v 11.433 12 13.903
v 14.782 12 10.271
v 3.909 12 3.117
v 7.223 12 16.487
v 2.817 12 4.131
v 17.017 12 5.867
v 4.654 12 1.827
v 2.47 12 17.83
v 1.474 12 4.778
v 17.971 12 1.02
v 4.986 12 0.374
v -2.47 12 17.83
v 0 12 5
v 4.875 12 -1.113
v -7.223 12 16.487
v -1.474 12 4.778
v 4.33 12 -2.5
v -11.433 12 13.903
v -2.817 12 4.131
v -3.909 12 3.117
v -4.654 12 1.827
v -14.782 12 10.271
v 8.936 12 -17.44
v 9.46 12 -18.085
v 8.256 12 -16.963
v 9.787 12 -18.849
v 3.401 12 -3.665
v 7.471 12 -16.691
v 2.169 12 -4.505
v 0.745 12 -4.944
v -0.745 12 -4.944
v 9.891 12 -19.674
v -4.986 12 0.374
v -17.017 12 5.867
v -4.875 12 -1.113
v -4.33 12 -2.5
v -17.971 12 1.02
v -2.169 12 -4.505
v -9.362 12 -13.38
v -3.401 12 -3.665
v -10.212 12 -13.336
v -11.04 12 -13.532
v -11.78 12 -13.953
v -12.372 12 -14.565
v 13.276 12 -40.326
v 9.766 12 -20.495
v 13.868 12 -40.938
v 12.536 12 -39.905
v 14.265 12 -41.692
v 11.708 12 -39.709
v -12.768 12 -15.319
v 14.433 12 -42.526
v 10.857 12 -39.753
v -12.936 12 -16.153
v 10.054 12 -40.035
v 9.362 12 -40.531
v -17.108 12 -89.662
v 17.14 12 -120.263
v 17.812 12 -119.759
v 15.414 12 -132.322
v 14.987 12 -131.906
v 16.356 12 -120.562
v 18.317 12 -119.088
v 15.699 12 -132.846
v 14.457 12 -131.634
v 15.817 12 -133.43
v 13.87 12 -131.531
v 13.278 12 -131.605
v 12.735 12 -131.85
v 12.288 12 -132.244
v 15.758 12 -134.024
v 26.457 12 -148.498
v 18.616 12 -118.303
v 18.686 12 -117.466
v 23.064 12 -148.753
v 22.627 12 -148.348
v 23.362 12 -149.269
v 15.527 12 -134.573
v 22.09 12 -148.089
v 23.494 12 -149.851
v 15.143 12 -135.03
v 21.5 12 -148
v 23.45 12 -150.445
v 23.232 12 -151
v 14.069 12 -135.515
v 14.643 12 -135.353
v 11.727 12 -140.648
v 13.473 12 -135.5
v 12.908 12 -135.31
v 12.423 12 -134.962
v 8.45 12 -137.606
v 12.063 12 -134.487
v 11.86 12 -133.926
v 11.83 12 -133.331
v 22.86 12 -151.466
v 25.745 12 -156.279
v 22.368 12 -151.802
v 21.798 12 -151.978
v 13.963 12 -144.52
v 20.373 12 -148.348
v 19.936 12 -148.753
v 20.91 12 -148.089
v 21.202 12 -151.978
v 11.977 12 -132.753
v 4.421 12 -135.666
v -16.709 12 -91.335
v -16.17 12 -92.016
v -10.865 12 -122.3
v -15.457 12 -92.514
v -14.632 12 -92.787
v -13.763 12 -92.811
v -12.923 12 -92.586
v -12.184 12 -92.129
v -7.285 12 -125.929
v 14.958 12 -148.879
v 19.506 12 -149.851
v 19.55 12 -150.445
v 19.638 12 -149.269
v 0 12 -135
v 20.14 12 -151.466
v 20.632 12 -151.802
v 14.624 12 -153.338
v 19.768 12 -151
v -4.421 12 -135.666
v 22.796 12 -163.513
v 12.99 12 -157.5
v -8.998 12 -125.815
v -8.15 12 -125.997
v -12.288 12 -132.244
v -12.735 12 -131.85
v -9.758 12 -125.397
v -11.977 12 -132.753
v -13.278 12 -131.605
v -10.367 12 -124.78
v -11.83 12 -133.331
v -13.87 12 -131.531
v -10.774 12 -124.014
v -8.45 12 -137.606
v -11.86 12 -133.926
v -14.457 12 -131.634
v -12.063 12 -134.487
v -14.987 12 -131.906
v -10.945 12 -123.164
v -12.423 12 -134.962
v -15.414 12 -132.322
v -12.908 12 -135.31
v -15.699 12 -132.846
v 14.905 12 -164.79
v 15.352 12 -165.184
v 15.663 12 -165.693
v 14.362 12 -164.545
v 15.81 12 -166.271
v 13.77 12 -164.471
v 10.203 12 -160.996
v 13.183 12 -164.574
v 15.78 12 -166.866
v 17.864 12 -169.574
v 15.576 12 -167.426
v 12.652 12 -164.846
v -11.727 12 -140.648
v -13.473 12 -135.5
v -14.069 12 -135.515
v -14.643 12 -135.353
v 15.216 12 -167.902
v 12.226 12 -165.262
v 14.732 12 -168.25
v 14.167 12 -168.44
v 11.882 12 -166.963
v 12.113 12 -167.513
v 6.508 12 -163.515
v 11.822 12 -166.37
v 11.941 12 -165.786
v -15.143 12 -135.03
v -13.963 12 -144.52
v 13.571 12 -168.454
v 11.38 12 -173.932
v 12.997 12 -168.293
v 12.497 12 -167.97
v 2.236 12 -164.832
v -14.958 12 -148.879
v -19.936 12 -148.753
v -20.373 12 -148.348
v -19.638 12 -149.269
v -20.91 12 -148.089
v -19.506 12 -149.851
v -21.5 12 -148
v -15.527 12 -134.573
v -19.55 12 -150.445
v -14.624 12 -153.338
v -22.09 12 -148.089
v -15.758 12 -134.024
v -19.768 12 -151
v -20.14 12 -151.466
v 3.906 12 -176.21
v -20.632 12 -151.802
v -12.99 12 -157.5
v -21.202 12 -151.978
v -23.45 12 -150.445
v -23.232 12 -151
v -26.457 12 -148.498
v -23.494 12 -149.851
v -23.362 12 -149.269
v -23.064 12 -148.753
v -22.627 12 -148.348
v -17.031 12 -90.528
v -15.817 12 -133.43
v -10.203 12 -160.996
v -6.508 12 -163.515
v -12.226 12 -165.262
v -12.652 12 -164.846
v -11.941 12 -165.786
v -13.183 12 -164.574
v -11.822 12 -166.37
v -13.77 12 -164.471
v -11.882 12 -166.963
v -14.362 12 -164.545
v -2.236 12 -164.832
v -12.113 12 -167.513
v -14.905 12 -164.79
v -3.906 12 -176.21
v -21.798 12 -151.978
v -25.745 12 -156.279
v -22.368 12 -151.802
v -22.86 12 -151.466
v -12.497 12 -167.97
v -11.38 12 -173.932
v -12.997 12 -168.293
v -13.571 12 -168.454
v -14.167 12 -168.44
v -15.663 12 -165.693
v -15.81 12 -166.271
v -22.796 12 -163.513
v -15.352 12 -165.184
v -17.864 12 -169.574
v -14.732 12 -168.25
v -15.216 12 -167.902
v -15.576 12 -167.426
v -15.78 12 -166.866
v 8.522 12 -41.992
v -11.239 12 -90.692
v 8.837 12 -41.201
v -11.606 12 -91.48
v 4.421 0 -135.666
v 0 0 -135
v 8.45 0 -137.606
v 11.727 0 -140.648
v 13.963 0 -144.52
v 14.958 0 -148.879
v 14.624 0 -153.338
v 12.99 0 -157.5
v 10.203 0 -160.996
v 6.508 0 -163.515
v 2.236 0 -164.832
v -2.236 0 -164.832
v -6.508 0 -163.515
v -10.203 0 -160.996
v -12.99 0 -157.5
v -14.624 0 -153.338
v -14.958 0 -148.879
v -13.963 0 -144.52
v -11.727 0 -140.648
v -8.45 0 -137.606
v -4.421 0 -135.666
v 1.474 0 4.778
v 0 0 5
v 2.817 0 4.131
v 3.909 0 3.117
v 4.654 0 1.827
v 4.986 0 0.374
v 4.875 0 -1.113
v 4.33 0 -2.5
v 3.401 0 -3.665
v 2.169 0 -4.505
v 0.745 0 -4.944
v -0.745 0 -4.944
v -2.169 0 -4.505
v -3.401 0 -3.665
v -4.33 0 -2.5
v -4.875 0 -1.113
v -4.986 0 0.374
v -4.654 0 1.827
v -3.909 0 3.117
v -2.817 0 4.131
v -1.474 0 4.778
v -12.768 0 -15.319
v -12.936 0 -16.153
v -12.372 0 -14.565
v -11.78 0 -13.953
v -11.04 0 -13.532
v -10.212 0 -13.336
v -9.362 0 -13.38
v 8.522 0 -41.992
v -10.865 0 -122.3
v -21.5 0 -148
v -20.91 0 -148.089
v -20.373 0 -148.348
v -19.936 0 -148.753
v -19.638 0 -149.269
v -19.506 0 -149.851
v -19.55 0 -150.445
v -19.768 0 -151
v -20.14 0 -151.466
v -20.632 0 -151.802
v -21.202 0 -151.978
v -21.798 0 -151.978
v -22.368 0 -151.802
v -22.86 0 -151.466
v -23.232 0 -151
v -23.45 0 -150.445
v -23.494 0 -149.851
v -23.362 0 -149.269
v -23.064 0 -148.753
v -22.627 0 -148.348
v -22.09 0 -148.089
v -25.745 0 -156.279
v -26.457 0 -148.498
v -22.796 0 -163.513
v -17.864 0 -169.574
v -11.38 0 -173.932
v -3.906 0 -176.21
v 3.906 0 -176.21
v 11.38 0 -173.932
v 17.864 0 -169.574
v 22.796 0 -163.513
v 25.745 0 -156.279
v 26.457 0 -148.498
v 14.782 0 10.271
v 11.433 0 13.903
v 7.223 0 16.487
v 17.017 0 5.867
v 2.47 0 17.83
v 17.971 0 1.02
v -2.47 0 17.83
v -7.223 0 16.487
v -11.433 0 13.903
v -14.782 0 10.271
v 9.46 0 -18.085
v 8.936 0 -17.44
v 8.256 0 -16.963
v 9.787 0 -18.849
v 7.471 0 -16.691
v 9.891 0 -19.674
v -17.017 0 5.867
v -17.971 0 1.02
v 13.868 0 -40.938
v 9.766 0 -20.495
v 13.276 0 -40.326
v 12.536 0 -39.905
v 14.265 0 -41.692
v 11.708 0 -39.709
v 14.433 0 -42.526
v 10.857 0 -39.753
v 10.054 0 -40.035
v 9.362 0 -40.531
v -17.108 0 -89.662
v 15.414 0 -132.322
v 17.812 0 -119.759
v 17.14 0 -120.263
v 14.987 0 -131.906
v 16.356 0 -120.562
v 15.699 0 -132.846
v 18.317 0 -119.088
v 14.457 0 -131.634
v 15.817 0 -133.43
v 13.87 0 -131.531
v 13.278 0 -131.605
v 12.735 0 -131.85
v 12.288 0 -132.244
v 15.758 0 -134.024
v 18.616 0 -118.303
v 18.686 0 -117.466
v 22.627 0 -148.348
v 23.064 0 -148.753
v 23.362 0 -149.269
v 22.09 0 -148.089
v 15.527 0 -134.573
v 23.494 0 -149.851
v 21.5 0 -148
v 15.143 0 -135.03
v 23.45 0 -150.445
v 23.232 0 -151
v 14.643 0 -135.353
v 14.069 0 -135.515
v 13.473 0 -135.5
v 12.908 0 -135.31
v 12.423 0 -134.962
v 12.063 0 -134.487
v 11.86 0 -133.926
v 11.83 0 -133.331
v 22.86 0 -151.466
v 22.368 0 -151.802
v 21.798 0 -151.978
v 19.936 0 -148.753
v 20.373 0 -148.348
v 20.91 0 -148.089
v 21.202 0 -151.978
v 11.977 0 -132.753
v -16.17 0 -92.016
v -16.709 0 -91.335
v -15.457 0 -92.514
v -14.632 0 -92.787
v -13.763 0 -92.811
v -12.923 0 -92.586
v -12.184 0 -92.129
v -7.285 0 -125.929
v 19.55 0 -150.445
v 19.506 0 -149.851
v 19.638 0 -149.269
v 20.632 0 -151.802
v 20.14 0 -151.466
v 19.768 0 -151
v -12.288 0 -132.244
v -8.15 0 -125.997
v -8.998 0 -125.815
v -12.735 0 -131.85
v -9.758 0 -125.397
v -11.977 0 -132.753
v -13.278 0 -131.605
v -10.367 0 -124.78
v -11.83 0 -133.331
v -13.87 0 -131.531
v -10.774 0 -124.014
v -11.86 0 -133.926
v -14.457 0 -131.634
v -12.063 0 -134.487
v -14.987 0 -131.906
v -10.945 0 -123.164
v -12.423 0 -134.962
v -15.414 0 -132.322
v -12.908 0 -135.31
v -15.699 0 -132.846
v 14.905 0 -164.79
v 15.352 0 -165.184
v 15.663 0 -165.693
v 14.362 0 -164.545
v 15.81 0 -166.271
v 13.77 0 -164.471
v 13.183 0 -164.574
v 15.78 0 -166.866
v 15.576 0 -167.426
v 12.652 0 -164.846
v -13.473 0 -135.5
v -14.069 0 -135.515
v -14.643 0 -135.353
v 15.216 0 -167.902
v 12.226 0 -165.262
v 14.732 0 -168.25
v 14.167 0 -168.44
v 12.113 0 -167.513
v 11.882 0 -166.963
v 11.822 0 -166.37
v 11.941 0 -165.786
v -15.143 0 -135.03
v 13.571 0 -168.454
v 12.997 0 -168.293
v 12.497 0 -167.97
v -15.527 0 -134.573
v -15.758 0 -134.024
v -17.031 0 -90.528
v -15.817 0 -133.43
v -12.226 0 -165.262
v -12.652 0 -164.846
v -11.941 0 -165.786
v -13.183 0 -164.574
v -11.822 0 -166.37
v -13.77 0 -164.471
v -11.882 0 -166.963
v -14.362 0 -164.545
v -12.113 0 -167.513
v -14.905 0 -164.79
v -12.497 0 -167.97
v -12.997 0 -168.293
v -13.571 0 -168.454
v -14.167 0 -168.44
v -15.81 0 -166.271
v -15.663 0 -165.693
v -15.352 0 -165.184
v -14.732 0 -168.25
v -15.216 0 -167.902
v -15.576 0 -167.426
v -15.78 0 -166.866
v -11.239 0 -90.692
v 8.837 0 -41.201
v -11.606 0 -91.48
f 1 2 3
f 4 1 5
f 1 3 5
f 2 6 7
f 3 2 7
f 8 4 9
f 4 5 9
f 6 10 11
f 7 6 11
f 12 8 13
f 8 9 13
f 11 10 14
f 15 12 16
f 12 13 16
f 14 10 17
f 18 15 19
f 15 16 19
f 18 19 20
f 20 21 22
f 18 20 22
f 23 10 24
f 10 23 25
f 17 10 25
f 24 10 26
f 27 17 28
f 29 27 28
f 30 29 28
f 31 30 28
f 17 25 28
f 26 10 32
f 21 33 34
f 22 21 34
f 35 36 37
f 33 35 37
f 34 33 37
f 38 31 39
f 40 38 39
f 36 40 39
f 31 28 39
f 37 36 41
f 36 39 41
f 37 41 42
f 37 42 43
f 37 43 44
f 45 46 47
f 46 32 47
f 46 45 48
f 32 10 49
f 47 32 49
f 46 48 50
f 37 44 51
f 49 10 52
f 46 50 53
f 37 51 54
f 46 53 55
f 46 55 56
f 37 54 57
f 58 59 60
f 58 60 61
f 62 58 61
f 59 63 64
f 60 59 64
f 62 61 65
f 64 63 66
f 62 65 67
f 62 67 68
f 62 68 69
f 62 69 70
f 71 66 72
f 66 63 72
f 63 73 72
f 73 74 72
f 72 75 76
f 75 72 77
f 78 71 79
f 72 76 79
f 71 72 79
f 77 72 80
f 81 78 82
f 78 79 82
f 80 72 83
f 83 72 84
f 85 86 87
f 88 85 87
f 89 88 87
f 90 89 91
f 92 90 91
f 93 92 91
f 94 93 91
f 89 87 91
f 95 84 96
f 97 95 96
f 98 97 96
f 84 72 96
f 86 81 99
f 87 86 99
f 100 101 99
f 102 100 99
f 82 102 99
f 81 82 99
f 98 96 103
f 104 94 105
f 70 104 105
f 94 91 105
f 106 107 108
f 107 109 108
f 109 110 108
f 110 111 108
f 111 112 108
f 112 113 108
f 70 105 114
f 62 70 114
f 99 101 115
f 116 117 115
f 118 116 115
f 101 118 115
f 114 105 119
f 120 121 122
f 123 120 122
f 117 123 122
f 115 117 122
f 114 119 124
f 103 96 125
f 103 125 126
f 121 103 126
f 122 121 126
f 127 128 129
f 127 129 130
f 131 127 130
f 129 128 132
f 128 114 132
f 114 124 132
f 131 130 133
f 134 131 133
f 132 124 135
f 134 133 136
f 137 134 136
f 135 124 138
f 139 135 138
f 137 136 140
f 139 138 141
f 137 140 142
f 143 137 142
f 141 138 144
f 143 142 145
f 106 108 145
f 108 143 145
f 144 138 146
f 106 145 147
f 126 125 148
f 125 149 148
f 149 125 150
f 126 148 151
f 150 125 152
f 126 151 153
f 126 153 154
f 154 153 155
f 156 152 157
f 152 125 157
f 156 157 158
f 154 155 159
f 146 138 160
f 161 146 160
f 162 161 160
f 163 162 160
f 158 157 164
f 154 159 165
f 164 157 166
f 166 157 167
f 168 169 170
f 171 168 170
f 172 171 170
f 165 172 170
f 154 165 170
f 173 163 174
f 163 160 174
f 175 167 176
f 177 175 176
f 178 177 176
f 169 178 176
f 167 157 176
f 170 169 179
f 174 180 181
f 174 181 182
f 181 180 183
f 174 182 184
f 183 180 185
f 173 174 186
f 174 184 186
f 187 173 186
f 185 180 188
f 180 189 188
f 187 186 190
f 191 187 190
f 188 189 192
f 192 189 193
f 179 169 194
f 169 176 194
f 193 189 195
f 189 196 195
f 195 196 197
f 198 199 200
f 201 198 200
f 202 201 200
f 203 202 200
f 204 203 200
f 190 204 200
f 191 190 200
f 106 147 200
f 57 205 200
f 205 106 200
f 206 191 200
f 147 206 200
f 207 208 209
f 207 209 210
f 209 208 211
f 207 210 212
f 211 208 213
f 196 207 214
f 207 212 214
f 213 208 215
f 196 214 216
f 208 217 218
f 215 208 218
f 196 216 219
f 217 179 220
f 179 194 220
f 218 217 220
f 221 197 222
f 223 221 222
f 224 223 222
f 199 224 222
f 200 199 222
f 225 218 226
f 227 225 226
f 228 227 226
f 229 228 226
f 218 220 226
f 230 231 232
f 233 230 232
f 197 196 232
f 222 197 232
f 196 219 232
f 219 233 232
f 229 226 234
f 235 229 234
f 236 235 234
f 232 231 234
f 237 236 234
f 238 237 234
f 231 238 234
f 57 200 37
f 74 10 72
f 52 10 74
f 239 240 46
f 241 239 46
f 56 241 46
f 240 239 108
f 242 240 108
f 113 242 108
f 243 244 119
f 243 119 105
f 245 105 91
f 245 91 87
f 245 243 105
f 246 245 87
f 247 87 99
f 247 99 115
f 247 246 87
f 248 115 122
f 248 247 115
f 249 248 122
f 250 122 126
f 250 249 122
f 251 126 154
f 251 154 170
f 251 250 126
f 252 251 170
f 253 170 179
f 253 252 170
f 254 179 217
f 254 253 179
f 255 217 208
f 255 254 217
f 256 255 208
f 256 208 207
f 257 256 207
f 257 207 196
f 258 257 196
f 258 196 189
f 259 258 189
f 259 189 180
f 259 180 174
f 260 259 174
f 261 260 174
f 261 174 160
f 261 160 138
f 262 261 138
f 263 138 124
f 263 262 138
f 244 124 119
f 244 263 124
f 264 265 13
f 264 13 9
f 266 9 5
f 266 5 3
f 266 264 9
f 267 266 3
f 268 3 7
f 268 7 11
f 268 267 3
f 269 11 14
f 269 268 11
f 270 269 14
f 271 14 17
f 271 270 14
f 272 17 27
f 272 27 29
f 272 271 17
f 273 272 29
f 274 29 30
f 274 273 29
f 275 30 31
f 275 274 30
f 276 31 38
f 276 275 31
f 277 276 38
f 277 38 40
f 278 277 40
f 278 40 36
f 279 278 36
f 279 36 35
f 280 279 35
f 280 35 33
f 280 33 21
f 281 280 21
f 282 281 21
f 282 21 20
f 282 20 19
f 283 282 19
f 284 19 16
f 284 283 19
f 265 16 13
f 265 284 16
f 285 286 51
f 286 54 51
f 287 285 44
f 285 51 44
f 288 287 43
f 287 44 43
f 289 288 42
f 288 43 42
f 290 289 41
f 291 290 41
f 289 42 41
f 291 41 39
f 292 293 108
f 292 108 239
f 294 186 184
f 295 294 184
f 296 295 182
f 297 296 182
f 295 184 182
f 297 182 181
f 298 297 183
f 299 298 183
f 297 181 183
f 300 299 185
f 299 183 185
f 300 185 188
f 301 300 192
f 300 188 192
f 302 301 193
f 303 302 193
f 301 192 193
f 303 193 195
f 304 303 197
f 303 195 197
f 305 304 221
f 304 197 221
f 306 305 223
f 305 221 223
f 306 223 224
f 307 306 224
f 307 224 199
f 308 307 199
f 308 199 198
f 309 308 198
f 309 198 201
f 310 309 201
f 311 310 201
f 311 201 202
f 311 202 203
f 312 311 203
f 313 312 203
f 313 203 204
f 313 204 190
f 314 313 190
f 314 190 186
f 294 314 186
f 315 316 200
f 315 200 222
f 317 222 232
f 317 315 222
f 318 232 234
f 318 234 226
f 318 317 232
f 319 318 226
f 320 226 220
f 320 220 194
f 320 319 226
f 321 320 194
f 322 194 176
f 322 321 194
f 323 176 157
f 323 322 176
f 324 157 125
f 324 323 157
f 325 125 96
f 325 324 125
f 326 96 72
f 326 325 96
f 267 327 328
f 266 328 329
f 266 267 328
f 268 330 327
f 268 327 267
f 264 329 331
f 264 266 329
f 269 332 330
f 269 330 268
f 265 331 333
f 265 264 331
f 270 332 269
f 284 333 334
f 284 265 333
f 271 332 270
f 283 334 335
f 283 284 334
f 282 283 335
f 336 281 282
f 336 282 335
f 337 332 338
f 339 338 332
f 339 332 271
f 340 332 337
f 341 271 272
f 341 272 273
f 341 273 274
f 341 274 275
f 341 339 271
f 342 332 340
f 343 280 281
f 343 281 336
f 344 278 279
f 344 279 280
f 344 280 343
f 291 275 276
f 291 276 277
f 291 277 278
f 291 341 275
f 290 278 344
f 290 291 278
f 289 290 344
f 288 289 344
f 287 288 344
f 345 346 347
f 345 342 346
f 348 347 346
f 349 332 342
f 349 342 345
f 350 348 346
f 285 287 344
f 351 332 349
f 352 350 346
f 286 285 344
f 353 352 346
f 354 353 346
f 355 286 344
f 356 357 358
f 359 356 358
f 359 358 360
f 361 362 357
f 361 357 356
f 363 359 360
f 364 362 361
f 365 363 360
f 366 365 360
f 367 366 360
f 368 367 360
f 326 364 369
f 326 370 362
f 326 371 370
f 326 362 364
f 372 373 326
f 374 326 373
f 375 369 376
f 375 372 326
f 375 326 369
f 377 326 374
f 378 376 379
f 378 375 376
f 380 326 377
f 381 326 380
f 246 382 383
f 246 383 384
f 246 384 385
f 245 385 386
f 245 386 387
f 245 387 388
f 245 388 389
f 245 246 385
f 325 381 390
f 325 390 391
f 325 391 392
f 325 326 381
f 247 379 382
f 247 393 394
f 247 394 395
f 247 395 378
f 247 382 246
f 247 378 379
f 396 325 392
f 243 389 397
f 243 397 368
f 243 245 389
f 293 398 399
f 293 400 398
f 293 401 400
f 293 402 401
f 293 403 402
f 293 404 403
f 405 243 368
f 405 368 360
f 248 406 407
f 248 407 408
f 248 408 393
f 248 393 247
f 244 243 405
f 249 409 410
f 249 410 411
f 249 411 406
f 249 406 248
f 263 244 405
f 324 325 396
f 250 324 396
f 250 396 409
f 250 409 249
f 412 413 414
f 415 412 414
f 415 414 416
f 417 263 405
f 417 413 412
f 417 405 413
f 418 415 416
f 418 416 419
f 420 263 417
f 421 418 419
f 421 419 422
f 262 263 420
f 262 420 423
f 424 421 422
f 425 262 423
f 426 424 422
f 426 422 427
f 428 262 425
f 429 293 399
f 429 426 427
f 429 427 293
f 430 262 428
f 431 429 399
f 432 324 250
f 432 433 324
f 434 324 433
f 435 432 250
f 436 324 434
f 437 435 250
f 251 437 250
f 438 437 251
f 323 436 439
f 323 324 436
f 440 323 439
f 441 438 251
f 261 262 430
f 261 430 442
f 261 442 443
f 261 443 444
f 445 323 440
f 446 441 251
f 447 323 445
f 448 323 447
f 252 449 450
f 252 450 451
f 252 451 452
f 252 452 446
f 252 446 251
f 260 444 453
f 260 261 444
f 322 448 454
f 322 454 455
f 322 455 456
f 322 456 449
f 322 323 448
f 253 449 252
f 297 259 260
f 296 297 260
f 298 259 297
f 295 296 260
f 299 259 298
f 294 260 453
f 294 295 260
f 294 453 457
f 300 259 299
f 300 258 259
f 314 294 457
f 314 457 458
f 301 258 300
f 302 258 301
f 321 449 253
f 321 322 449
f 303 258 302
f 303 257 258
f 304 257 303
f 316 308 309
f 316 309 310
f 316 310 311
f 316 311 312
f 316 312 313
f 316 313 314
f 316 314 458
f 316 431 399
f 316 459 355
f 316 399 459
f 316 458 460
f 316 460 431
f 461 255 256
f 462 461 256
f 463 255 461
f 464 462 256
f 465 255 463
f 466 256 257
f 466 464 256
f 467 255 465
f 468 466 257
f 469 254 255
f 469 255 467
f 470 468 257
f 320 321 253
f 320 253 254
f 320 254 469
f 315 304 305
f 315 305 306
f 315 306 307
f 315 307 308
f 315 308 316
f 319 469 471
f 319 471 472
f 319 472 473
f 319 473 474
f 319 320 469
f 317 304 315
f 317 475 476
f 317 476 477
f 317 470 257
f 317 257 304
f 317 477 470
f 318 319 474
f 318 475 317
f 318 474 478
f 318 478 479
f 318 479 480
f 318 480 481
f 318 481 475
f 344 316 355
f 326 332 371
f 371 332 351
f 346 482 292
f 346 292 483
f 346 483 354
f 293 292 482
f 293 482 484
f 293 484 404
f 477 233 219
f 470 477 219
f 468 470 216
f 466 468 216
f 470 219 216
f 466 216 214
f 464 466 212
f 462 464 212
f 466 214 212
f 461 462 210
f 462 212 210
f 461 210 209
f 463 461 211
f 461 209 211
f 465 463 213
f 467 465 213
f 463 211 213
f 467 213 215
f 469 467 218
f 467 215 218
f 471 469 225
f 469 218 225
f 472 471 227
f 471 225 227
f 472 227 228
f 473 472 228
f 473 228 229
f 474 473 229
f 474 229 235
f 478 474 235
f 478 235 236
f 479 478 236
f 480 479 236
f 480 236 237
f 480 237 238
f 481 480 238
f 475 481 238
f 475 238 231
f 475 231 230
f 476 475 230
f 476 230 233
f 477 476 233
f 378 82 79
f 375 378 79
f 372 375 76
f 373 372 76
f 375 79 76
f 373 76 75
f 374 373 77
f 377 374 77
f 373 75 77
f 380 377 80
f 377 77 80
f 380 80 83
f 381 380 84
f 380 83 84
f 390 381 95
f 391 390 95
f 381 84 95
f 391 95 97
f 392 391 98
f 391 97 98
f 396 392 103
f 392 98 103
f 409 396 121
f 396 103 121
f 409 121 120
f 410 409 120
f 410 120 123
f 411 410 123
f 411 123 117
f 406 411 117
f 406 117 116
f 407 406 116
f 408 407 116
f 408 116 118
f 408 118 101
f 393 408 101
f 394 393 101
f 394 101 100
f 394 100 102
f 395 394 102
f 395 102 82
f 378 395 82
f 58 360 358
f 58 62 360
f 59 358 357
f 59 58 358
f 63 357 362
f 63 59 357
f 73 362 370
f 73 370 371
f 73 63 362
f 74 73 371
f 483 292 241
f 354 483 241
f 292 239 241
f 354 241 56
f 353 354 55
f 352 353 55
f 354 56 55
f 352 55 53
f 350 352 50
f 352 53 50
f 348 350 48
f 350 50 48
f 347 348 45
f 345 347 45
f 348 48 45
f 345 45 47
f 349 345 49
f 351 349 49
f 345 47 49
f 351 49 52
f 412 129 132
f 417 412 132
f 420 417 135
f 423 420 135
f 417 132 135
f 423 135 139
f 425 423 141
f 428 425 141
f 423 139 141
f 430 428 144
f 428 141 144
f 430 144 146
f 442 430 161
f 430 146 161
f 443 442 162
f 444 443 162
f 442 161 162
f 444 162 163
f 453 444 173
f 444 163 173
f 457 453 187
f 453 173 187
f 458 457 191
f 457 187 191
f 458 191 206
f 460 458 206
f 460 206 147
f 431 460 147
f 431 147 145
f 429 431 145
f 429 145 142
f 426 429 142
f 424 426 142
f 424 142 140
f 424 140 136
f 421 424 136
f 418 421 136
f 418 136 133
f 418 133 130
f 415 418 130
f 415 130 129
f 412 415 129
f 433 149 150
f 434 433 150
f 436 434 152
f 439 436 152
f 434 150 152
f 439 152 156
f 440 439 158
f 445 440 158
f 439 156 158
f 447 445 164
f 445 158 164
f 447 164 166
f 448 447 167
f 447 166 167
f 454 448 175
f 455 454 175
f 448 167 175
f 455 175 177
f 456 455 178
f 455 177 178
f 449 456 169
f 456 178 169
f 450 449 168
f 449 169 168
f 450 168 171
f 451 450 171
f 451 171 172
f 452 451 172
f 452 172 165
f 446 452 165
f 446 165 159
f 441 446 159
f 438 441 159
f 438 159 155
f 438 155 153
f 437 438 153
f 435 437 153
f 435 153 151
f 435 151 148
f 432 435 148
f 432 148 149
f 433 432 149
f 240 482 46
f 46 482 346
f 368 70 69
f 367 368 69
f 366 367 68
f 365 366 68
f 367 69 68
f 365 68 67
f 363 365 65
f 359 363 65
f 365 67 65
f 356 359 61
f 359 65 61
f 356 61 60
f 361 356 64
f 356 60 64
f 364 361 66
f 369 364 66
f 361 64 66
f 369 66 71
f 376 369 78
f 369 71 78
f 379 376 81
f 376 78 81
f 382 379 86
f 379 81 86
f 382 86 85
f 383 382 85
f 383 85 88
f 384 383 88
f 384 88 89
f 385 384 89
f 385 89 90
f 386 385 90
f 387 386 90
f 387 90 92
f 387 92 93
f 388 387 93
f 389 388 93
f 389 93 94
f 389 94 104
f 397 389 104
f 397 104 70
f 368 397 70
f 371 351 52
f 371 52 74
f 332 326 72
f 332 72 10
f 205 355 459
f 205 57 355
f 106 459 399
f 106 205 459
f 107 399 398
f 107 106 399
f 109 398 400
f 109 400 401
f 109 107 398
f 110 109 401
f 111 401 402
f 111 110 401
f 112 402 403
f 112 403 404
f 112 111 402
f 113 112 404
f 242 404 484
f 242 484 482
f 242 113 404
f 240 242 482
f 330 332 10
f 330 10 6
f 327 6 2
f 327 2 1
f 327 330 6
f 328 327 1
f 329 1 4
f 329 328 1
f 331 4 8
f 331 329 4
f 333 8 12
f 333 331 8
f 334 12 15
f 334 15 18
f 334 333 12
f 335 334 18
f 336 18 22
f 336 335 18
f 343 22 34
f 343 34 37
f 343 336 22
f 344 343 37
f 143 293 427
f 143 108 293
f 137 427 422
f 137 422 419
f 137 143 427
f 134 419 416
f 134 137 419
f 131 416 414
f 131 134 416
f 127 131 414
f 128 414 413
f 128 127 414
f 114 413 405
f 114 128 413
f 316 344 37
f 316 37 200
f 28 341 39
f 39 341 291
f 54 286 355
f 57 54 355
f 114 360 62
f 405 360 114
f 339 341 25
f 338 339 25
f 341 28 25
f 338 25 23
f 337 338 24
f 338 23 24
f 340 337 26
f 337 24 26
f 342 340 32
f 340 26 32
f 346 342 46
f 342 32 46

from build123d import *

# Parameters (mm, degrees)
SKETCH_1_R               = 5
SKETCH_1_R_2             = 15
EXTRUDE_1_DEPTH          = 12
FILLET_1_R               = 3
SKETCH_2_R               = 2
CUT_EXTRUDE_1_DEPTH      = 179.881245523
PATTERN_CIRCULAR_3_COUNT = 2
PATTERN_CIRCULAR_3_ANGLE = 50
PATTERN_CIRCULAR_4_COUNT = 2
PATTERN_CIRCULAR_4_ANGLE = 50


with BuildPart() as part:
    # 草图1 → 凸台-拉伸1 (new body)
    with BuildSketch(Plane(origin=(0, 0, 0), x_dir=(1, 0, 0), z_dir=(0, 1, 0))):
        with BuildLine():
            Line((-17.971076762, -1.02), (-26.457418567, 148.498333333))
            ThreePointArc((-26.457418567, 148.498333333), (0, 176.5), (26.457418567, 148.498333333))
            Line((26.457418567, 148.498333333), (17.971076762, -1.02))
            ThreePointArc((17.971076762, -1.02), (0, -18), (-17.971076762, -1.02))
        make_face()
        with Locations(Location((0, 0, 0), (0, 0, 270))):
            Circle(SKETCH_1_R, mode=Mode.SUBTRACT)
        with Locations(Location((0, 150, 0), (0, 0, 270))):
            Circle(SKETCH_1_R_2, mode=Mode.SUBTRACT)
        Polygon((-12.740980954, 12.714849757), (-18.554385191, 115.139490738), (10.712851955, 17.329399023), align=None, mode=Mode.SUBTRACT)
        Polygon((13.283215706, 22.268322657), (18.830257334, 120), (-12, 127), align=None, mode=Mode.SUBTRACT)
    extrude(amount=EXTRUDE_1_DEPTH)

    # 圆角1
    fillet_1_edges = [part.edges().sort_by_distance(p)[0] for p in [
        (-12.740980954, 6, -12.714849757),
        (10.712851955, 6, -17.329399023),
        (-18.554385191, 6, -115.139490738),
        (18.830257334, 6, -120),
        (-12, 6, -127),
        (13.283215706, 6, -22.268322657),
    ]]
    fillet(fillet_1_edges, radius=FILLET_1_R)

    # 草图2 → 切除-拉伸1 (cut, through all)
    with BuildSketch(Plane(origin=(0, 12, 0), x_dir=(1, 0, 0), z_dir=(0, 1, 0))):
        with Locations(Location((-21.5, 150, 0), (0, 0, 270))):
            Circle(SKETCH_2_R)
        with Locations(Location((21.5, 150, 0), (0, 0, 270))):
            Circle(SKETCH_2_R)
    cut_extrude_1 = extrude(amount=-CUT_EXTRUDE_1_DEPTH, mode=Mode.SUBTRACT)

    # 阵列(圆周)3: 切除-拉伸1 ×2 about axis
    pattern_circular_3_axis = Axis((0, 0, -150), (0, 1, 0))
    for i in range(1, PATTERN_CIRCULAR_3_COUNT):
        add(cut_extrude_1.rotate(pattern_circular_3_axis, i * PATTERN_CIRCULAR_3_ANGLE / (PATTERN_CIRCULAR_3_COUNT - 1)), mode=Mode.SUBTRACT)

    # 阵列(圆周)4: 切除-拉伸1 ×2 about axis
    pattern_circular_4_axis = Axis((0, 0, -150), (0, -1, 0))
    for i in range(1, PATTERN_CIRCULAR_4_COUNT):
        add(cut_extrude_1.rotate(pattern_circular_4_axis, i * PATTERN_CIRCULAR_4_ANGLE / (PATTERN_CIRCULAR_4_COUNT - 1)), mode=Mode.SUBTRACT)


solid = part.part
